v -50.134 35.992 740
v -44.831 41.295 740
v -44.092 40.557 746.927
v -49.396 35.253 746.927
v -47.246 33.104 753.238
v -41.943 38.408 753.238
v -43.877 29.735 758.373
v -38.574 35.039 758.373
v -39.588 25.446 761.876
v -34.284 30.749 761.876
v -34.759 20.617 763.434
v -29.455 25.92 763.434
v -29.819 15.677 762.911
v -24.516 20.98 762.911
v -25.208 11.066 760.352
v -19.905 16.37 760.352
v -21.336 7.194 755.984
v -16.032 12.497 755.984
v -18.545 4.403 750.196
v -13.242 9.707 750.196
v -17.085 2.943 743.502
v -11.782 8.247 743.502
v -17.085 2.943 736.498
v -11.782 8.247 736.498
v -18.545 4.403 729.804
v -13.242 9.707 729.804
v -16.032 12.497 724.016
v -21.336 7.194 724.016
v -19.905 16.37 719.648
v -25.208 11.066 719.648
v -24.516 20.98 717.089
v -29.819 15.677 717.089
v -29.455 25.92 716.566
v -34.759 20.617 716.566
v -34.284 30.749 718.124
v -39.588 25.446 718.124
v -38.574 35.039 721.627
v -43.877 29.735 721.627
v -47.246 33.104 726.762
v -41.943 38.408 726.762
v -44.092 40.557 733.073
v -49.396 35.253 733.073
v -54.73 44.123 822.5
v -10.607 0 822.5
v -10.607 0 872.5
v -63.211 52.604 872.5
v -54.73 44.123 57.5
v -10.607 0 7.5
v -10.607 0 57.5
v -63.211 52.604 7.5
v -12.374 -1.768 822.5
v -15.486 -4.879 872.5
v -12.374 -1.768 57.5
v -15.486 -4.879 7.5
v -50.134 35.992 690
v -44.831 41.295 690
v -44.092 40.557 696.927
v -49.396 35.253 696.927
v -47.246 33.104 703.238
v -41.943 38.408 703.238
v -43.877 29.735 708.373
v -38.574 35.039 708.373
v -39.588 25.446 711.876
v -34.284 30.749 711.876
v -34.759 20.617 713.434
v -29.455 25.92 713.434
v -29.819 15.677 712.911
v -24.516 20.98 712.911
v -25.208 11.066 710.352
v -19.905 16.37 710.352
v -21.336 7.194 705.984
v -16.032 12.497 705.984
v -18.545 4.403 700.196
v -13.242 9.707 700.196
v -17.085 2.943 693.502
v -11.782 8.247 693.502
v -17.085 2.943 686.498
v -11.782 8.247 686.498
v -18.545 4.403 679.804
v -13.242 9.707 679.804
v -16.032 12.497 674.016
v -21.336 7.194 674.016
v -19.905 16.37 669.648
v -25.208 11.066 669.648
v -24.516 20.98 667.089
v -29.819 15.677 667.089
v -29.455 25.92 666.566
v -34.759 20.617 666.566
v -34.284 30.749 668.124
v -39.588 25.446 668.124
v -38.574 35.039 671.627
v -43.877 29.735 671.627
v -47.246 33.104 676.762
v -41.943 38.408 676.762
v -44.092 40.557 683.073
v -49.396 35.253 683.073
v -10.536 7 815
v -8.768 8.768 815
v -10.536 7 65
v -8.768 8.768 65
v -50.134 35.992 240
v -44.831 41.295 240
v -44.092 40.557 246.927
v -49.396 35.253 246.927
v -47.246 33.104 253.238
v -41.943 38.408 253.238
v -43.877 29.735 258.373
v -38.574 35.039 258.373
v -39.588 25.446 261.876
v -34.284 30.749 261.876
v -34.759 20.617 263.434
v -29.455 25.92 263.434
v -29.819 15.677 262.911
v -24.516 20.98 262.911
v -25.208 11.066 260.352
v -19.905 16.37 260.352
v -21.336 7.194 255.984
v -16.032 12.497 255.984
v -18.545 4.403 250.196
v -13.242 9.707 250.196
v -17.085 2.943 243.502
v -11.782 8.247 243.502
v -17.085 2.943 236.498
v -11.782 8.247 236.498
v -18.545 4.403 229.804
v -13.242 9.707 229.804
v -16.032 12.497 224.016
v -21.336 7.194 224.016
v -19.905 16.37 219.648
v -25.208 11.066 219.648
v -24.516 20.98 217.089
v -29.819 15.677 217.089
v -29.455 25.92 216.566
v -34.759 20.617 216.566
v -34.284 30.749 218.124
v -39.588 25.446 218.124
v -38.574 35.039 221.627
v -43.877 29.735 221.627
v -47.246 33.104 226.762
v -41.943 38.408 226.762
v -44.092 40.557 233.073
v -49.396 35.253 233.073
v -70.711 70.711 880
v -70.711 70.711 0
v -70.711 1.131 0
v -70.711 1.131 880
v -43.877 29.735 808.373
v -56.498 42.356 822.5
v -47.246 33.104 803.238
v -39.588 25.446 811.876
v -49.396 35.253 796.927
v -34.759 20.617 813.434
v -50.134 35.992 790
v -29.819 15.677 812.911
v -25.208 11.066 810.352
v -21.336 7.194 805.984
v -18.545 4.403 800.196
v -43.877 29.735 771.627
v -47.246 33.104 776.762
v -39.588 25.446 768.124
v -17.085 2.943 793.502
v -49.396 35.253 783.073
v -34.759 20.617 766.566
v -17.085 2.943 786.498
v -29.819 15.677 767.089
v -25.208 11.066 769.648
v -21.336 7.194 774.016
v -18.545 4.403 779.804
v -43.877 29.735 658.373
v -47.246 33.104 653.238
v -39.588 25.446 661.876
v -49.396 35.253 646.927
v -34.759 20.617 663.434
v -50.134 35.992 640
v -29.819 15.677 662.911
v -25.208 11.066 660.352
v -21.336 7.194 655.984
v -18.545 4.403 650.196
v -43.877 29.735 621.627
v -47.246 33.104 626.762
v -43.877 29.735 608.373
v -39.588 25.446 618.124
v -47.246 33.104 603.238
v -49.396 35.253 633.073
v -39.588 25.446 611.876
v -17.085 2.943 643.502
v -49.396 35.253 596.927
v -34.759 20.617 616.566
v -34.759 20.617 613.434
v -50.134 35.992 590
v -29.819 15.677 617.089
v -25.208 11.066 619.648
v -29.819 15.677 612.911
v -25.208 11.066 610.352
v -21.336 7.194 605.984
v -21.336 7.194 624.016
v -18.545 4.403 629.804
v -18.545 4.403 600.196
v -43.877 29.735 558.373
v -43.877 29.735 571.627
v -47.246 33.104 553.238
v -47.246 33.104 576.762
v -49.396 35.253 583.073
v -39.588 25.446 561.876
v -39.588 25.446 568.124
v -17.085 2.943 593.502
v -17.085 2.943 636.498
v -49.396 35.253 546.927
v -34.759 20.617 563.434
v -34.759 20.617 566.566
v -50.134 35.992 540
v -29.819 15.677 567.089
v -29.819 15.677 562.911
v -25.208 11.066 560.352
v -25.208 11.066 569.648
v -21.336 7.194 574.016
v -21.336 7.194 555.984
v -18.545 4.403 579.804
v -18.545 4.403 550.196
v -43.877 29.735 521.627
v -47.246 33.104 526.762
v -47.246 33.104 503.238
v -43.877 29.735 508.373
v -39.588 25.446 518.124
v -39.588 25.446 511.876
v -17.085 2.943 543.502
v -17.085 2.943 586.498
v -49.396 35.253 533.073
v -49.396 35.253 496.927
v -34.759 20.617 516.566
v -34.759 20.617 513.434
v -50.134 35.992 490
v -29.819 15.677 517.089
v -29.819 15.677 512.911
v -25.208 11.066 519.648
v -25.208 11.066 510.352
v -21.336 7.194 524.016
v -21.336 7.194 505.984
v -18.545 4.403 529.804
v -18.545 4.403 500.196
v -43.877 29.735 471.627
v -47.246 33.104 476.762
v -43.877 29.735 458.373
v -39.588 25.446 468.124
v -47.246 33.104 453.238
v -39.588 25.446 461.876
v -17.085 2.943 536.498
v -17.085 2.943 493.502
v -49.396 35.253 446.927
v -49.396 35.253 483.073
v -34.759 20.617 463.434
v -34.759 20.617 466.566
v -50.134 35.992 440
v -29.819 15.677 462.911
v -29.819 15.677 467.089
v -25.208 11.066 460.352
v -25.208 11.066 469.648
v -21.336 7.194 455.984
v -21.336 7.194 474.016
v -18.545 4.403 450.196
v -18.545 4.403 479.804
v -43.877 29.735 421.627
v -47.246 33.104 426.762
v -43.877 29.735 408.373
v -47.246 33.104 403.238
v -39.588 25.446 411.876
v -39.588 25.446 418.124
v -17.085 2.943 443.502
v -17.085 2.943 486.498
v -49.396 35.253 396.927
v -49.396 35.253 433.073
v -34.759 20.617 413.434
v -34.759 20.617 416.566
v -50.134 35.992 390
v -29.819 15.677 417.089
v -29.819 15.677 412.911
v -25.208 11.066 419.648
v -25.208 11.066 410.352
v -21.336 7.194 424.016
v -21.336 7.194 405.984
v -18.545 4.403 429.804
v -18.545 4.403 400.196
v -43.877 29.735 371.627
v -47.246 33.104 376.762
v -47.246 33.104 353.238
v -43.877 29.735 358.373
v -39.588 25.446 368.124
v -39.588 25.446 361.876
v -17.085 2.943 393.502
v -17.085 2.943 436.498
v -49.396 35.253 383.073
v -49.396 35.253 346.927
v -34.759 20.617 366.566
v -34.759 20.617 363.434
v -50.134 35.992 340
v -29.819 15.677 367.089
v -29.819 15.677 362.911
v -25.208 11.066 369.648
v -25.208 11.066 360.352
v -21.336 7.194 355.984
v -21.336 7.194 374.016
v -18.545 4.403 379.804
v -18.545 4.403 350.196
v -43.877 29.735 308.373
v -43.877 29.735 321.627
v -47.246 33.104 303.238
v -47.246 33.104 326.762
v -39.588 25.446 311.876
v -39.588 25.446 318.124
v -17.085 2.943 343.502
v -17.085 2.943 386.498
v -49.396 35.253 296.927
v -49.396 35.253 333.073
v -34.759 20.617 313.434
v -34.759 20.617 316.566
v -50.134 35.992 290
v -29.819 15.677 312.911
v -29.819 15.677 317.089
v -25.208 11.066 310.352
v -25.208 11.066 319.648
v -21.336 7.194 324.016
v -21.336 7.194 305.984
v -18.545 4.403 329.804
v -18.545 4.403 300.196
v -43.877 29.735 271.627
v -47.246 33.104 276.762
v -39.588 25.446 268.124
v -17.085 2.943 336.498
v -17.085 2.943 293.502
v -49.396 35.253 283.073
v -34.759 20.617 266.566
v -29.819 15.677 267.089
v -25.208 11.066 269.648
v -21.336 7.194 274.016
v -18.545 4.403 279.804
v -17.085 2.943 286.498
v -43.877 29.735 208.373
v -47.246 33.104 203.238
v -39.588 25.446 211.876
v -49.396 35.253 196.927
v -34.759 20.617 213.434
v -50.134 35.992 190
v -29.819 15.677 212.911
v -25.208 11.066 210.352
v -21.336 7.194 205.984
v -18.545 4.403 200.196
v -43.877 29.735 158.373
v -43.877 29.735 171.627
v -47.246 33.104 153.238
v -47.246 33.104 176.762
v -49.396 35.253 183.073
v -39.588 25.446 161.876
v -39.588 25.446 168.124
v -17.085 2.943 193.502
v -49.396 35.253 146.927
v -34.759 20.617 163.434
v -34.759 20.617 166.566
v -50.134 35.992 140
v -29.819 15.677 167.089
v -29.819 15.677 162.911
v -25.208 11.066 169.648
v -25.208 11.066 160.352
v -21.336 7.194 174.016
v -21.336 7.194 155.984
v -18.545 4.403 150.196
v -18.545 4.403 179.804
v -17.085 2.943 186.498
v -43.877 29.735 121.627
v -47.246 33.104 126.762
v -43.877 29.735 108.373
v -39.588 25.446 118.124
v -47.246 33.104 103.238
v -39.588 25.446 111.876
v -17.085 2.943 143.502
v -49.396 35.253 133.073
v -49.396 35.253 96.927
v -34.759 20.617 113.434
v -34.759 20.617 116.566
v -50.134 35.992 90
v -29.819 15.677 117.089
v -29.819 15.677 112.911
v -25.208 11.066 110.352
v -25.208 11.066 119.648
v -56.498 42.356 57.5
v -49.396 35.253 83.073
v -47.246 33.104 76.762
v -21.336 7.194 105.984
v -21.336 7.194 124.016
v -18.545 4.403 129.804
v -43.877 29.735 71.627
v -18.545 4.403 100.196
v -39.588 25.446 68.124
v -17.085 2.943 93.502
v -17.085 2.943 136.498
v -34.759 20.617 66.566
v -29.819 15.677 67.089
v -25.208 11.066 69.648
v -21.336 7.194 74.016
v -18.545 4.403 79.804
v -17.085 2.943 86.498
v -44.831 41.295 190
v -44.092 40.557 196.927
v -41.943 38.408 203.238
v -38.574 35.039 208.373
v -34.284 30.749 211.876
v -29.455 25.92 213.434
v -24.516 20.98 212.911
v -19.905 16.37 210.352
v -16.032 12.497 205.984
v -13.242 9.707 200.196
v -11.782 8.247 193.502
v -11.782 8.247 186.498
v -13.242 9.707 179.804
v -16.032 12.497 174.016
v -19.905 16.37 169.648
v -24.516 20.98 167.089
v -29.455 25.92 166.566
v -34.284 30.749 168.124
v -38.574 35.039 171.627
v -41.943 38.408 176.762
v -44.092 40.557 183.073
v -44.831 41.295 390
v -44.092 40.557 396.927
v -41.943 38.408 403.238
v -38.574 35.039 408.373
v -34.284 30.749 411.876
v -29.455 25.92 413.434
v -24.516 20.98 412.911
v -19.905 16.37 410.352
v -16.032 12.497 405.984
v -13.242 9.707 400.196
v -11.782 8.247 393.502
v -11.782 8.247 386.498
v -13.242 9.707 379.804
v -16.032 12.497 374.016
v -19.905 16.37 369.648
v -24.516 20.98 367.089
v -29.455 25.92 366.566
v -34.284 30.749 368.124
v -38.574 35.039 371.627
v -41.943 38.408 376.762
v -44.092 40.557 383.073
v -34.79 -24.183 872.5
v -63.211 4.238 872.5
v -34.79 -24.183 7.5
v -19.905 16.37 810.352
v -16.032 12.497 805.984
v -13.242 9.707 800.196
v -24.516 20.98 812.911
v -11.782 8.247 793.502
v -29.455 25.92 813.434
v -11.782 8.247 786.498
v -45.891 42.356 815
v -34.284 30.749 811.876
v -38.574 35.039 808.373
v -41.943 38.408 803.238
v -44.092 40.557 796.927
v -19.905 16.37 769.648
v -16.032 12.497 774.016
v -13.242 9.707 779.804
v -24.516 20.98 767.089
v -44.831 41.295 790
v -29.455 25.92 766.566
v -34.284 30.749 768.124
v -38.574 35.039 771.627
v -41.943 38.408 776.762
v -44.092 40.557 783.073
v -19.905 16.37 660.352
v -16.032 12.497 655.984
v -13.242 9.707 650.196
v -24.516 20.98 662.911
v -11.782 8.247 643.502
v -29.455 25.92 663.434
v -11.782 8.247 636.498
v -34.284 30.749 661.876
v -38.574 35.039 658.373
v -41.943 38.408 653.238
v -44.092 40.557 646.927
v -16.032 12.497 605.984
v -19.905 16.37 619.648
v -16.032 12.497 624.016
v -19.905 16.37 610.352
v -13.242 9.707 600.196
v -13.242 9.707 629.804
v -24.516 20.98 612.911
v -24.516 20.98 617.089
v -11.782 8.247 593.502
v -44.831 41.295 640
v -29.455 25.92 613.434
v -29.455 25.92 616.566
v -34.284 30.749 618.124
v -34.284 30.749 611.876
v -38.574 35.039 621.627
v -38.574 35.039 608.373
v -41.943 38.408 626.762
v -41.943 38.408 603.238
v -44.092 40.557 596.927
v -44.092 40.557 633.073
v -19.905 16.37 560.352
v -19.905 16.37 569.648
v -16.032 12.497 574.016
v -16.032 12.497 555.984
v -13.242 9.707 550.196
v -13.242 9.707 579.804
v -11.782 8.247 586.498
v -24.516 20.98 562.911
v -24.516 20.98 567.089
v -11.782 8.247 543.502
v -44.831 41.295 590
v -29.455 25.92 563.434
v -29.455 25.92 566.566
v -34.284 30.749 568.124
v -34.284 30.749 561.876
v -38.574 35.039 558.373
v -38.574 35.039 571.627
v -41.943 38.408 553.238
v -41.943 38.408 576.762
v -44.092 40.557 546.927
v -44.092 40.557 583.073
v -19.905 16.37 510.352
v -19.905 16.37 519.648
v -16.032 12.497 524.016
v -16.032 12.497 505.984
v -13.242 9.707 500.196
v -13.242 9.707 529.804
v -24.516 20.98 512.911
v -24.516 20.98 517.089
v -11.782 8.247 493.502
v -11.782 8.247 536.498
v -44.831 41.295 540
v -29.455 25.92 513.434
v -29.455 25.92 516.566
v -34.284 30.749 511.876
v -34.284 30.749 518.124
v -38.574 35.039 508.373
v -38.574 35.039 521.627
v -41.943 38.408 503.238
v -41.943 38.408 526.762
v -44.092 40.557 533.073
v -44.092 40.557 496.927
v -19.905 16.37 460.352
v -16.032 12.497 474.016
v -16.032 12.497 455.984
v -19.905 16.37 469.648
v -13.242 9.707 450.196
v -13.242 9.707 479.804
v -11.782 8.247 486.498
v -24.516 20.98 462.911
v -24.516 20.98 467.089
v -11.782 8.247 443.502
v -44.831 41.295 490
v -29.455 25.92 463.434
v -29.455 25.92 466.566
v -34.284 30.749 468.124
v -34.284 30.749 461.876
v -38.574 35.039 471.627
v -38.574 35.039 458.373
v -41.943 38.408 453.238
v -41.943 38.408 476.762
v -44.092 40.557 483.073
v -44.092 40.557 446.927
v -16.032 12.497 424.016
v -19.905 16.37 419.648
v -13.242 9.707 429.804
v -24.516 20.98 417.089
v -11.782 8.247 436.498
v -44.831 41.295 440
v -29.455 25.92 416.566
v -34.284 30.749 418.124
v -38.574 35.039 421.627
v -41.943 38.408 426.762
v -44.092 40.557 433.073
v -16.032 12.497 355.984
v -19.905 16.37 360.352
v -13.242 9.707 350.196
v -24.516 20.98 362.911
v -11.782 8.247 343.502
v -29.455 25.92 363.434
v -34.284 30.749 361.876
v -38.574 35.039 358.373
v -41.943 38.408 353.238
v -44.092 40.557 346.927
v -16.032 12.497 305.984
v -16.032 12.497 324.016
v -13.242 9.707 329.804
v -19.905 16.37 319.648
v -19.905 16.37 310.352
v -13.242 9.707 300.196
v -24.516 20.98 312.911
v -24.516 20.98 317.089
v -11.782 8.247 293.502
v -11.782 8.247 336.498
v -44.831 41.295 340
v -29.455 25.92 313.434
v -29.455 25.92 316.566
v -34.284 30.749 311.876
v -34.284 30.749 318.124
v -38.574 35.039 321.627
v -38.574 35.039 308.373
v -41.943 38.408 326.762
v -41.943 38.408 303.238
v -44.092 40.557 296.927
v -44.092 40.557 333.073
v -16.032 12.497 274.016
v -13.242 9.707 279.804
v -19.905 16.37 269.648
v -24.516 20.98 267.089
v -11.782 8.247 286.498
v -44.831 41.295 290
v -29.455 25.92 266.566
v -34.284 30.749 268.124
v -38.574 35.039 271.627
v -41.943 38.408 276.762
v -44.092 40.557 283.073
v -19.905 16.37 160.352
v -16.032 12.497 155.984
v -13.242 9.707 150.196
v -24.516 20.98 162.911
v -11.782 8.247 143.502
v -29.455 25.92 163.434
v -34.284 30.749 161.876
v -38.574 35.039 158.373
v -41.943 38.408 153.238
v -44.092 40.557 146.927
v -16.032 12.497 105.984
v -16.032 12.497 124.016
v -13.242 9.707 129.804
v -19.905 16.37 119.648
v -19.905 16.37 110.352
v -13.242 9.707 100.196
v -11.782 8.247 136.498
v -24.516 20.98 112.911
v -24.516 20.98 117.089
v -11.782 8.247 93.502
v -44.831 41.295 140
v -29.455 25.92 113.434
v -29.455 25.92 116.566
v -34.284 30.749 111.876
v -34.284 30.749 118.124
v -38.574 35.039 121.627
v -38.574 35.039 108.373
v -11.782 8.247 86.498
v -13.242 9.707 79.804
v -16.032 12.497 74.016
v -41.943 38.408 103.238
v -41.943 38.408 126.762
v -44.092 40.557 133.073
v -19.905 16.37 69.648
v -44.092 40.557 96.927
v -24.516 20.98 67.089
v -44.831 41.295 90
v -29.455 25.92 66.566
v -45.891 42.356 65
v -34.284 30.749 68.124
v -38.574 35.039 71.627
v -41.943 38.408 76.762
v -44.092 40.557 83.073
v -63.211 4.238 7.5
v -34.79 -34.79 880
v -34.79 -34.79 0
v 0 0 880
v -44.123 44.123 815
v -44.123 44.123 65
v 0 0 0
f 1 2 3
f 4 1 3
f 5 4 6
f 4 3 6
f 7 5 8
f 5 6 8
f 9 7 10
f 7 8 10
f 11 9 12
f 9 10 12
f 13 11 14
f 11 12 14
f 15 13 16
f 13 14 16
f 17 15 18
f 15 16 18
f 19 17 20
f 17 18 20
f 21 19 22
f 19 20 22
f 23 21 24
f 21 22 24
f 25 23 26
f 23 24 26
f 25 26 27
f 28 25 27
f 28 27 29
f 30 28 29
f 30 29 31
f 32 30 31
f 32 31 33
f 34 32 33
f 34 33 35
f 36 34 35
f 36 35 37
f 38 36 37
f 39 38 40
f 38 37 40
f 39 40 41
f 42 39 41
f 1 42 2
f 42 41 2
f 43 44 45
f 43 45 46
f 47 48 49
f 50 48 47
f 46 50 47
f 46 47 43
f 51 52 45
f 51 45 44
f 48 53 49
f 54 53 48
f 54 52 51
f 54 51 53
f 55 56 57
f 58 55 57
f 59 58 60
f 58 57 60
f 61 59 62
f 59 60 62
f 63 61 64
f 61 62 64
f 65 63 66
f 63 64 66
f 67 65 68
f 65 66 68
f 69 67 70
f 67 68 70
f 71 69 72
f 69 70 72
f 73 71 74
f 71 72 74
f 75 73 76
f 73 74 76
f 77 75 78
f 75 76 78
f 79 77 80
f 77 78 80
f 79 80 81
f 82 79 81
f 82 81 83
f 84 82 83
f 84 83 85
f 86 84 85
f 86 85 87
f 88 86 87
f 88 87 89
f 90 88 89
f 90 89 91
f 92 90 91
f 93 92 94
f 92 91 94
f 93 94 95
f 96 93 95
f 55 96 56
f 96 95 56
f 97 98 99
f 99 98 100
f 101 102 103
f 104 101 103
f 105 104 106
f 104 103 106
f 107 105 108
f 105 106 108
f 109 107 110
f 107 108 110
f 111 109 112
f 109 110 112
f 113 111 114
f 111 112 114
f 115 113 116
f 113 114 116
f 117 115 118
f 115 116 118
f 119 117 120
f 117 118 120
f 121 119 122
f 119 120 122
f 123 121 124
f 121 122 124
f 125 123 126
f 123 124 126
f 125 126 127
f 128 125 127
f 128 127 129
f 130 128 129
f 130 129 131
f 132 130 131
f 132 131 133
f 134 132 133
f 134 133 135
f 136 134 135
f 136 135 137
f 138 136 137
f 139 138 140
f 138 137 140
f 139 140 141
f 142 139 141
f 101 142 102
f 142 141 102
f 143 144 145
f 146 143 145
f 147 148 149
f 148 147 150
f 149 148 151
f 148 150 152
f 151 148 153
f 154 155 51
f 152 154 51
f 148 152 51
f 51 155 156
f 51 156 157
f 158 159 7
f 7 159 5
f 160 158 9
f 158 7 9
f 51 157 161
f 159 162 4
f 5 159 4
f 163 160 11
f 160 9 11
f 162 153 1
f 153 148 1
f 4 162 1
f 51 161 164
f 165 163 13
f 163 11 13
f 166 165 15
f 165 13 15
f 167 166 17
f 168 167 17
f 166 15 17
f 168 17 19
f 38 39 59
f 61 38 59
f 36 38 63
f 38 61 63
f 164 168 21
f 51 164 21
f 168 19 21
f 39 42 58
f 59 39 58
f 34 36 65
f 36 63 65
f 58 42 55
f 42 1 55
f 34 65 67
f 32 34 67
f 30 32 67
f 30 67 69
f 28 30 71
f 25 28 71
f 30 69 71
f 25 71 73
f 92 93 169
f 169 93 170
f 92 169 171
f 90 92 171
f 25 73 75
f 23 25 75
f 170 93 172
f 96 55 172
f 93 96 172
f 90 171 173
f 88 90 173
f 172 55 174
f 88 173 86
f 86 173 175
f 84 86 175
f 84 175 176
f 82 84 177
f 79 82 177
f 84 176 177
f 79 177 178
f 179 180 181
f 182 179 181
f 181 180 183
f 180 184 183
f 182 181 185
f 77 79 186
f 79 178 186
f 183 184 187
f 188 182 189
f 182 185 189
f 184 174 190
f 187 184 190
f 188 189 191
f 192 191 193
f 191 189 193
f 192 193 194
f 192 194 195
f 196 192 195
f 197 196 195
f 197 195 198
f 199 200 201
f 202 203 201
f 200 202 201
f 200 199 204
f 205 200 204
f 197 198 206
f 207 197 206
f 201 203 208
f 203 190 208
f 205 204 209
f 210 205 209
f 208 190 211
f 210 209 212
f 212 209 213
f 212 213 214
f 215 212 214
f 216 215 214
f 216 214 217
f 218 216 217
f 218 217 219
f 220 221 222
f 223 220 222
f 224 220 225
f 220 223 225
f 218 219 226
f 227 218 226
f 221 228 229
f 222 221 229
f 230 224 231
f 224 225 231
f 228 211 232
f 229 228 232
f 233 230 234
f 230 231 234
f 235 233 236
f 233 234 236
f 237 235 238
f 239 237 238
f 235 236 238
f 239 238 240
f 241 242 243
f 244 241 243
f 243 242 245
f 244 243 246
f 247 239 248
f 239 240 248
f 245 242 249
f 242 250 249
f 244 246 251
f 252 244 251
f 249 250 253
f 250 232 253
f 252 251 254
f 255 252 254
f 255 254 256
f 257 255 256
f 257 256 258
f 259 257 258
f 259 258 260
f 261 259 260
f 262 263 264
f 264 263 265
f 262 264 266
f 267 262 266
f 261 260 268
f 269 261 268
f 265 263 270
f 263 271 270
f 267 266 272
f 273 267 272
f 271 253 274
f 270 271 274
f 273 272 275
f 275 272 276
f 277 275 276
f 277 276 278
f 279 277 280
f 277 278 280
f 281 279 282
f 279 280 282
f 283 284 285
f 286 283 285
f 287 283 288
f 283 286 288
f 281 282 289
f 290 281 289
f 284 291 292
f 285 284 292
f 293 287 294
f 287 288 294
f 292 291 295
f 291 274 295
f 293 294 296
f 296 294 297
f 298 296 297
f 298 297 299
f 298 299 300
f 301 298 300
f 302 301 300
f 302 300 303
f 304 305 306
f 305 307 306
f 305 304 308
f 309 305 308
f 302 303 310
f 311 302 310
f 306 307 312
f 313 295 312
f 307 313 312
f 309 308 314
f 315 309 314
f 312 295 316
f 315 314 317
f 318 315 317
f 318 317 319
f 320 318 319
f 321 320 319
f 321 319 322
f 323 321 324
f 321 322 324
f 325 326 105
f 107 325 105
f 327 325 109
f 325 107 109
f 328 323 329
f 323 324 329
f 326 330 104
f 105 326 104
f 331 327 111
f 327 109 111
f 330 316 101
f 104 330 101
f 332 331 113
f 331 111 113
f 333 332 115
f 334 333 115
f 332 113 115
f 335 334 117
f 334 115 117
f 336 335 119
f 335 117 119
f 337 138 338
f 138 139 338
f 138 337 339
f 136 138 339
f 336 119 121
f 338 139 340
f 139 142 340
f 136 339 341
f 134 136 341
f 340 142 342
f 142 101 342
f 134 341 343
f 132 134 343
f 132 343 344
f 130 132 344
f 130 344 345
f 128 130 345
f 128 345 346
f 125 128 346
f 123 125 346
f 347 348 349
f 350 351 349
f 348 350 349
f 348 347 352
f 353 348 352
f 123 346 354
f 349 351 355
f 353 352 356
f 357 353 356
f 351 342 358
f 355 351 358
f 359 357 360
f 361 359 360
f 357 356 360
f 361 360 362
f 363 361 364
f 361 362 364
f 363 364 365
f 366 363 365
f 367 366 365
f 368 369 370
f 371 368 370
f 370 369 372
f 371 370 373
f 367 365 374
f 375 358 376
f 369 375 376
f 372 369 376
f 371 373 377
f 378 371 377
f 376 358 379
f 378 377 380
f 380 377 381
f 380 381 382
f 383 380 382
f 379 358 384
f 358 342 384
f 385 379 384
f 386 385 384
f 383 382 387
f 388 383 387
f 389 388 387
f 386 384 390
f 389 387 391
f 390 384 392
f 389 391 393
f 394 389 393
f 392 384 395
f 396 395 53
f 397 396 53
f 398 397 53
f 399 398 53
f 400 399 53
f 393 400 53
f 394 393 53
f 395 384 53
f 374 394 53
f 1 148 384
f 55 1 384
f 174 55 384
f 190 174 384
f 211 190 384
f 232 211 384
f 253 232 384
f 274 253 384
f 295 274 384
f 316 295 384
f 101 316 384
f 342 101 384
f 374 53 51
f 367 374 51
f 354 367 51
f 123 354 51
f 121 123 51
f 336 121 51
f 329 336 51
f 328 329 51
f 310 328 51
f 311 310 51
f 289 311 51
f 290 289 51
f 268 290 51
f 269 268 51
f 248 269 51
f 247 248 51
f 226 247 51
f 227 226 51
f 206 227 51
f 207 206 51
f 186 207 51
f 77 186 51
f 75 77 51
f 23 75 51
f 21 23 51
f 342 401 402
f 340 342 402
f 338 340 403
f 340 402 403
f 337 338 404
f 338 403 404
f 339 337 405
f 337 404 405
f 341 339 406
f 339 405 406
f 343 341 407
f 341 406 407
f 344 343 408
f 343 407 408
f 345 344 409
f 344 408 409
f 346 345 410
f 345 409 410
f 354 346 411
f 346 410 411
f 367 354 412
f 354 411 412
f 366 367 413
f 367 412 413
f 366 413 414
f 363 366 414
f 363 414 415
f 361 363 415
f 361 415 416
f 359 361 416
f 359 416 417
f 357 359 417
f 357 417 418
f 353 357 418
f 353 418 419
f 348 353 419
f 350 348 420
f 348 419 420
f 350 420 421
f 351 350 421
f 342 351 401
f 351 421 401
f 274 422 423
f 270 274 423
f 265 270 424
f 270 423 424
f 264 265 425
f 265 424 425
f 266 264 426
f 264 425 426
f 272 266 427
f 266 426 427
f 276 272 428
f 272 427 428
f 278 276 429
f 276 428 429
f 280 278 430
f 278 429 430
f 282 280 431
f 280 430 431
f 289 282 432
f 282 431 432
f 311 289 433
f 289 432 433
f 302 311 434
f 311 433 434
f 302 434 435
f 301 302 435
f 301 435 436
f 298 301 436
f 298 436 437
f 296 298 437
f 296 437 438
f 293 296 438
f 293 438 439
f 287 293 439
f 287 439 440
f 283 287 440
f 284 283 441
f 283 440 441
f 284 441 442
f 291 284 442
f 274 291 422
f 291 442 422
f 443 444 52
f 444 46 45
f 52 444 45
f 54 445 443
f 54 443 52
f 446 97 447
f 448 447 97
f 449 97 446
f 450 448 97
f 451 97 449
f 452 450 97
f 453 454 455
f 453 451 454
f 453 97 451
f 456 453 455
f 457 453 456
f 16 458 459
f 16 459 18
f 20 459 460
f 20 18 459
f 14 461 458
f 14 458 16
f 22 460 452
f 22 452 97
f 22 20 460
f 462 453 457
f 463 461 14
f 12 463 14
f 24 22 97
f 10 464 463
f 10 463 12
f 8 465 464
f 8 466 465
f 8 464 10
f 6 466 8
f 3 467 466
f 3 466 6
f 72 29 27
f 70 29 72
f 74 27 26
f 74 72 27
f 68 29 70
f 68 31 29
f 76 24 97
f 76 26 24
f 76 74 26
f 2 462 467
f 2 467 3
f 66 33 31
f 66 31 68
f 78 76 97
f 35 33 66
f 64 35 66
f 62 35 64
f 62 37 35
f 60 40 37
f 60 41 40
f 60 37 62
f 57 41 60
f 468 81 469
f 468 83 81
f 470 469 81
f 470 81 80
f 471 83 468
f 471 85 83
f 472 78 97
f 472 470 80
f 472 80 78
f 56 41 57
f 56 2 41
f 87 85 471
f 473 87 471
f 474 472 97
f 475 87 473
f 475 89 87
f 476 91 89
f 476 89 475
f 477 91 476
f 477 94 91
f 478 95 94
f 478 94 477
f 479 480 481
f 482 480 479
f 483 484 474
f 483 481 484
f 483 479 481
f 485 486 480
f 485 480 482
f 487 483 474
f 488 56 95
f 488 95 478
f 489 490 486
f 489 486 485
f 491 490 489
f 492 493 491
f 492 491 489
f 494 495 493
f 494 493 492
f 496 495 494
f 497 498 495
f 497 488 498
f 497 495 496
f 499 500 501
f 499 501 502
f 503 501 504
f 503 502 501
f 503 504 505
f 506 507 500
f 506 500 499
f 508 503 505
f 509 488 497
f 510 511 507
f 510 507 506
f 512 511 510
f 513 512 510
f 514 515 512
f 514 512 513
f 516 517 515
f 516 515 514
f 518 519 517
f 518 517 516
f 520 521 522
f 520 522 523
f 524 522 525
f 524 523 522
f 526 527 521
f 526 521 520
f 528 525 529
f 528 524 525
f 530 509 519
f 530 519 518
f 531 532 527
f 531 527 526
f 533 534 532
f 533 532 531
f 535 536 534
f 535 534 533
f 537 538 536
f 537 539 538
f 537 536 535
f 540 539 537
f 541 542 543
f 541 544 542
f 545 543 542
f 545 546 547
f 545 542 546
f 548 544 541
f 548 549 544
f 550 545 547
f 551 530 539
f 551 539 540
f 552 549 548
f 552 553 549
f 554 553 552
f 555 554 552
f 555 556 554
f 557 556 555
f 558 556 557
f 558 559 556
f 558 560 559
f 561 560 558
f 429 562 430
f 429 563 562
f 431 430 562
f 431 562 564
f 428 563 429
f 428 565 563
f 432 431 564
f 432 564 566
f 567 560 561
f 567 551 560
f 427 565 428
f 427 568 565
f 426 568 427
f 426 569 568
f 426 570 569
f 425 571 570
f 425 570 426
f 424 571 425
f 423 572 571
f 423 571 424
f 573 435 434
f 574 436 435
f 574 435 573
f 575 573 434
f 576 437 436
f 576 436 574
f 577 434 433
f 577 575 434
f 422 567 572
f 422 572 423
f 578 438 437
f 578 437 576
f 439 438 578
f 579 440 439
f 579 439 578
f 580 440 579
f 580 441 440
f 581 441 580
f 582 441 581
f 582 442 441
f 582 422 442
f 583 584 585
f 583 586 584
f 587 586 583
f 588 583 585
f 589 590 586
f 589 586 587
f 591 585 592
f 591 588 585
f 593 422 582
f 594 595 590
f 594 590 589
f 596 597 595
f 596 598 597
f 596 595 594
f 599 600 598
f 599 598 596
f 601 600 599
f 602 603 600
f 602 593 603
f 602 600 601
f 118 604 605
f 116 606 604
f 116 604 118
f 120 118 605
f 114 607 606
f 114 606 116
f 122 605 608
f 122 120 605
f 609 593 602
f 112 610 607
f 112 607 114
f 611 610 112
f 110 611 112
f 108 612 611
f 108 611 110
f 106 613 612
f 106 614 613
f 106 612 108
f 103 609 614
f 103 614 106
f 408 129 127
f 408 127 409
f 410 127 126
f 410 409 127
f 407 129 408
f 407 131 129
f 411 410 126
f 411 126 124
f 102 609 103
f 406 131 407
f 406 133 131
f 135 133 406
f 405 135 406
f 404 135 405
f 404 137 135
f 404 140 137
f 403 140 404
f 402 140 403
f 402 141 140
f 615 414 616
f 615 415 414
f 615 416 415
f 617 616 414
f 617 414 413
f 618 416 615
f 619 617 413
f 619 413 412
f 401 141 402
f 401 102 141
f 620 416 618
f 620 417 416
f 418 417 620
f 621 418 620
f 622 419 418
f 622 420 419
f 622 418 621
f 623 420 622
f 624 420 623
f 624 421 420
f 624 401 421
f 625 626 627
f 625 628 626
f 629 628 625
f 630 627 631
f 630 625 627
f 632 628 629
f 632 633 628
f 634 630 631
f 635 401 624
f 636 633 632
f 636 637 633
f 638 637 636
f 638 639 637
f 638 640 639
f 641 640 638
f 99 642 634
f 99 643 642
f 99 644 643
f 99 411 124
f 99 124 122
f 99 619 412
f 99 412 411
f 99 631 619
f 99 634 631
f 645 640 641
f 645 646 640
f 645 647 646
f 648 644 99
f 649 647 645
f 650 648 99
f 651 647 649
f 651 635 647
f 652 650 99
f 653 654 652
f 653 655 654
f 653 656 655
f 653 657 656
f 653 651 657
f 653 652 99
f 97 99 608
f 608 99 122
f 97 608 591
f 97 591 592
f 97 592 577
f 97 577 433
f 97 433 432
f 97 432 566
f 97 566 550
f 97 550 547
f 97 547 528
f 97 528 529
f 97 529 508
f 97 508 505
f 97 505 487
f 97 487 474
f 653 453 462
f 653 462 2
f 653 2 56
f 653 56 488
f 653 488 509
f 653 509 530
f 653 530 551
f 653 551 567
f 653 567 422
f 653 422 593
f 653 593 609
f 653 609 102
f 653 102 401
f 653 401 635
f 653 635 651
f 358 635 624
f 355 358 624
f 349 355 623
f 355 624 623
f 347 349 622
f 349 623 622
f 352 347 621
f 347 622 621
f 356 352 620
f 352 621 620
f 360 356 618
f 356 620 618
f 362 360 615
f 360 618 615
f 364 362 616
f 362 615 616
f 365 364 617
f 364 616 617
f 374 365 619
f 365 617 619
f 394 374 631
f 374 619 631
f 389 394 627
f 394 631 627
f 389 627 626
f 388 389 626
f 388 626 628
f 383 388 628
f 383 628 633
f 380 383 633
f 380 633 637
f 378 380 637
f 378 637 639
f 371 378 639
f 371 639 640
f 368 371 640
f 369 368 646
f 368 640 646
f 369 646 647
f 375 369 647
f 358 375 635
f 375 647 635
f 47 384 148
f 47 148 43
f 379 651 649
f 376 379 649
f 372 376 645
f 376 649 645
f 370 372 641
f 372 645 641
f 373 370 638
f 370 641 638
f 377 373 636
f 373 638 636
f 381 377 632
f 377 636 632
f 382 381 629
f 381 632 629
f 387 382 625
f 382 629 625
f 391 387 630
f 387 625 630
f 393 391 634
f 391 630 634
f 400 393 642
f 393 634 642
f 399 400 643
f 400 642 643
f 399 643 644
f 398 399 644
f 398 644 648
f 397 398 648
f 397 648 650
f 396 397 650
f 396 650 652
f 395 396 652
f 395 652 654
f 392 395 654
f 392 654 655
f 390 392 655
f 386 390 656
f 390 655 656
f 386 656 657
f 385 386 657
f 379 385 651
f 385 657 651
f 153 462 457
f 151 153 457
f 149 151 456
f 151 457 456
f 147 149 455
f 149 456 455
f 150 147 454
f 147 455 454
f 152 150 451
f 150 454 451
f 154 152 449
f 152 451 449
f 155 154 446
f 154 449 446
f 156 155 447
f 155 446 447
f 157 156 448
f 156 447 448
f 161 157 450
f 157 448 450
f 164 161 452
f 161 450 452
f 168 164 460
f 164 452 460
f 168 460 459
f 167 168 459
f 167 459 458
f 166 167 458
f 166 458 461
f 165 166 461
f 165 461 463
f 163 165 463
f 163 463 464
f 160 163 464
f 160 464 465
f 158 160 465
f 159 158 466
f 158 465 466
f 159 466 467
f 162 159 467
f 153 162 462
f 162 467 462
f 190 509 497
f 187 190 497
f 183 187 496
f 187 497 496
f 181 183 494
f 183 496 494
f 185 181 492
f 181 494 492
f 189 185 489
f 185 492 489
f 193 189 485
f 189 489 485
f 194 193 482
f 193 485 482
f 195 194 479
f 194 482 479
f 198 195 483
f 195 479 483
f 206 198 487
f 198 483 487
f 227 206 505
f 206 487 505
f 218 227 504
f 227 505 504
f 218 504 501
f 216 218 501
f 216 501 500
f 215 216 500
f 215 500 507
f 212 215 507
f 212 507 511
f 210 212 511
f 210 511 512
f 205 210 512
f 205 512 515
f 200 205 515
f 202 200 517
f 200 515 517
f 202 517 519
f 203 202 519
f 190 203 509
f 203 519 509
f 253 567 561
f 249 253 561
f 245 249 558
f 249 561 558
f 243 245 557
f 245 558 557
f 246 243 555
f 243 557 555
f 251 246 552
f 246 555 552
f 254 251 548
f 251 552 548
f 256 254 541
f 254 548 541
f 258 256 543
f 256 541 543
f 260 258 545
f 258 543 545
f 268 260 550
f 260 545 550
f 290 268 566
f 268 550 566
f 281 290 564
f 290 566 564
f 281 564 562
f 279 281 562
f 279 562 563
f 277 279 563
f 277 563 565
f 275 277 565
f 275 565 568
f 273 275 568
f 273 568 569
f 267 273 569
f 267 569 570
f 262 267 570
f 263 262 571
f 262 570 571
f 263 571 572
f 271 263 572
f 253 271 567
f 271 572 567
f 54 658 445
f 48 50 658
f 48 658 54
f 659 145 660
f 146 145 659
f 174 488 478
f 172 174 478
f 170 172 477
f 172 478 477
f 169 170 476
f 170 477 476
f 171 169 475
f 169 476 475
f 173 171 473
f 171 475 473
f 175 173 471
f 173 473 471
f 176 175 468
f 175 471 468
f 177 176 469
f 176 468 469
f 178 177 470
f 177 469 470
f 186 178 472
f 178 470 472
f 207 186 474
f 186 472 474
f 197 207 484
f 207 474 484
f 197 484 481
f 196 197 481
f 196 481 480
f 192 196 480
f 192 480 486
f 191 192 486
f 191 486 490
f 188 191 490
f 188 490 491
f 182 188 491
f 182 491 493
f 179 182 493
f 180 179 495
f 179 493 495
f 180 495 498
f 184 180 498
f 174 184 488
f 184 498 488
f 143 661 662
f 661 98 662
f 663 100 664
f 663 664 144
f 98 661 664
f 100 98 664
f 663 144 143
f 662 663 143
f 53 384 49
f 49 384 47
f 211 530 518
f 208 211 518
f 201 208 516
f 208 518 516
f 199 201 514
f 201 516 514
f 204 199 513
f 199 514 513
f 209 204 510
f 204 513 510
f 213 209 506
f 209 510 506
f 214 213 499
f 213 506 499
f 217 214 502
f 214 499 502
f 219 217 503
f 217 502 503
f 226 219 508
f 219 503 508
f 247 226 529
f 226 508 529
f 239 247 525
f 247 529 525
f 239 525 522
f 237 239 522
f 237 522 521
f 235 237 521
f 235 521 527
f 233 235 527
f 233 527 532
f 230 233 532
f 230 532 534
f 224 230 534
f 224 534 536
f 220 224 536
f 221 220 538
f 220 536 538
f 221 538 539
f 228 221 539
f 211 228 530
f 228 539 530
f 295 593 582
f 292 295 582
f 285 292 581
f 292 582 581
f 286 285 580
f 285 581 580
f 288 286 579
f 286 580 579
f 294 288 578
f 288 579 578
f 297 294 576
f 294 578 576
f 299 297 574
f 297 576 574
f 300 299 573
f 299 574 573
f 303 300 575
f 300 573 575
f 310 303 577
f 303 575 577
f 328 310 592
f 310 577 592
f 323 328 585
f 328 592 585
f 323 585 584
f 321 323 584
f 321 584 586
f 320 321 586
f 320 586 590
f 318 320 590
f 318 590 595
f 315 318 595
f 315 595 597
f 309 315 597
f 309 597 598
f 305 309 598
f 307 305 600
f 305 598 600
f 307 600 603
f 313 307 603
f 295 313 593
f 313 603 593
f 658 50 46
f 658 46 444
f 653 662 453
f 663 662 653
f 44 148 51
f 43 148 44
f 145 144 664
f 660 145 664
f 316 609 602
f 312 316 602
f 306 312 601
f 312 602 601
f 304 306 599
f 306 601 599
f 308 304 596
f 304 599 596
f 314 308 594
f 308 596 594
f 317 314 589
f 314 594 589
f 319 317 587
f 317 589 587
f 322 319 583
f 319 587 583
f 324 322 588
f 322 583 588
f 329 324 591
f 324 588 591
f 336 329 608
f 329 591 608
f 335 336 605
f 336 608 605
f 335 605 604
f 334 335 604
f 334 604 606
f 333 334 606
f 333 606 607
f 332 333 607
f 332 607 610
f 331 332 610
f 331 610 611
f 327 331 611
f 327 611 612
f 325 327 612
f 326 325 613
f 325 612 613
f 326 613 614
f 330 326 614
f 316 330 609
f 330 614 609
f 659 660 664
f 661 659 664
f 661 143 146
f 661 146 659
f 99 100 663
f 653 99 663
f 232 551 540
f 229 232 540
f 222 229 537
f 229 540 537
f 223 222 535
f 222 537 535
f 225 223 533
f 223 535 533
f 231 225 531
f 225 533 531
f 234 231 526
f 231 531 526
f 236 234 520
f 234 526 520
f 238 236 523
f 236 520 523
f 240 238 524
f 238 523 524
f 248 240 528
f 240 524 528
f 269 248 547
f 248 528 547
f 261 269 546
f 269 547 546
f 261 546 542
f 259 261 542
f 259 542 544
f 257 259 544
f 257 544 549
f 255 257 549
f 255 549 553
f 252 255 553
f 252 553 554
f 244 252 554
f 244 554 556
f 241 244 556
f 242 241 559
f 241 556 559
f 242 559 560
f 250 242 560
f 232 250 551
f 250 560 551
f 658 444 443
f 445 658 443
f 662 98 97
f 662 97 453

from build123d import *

# Parameters (mm, degrees)
BOSS_EXTRUDE1_DEPTH = 880
CHAMFER1_SIZE       = 50.8
CHAMFER1_SIZE2      = 71.842048969
SKETCH3_W           = 750
SKETCH3_H           = 50
CUT_EXTRUDE1_DEPTH  = 2.5
SKETCH4_R           = 23.5
CUT_EXTRUDE2_DEPTH  = 11.9
SHELL1_START        = -14.4
SHELL1_OUTLINE_W    = 62.4
SHELL1_OUTLINE_H    = 765
SHELL1_OUTLINE_R    = 23.5
SHELL1_DEPTH        = 4.4
SHELL1_START_2      = 7.5
SHELL1_2_DEPTH      = 865
SHELL1_3_DEPTH      = 50
SHELL1_START_3      = 822.5
SHELL1_4_DEPTH      = 50


with BuildPart() as part:
    # Sketch1 → Boss-Extrude1 (new body)
    with BuildSketch(Plane.XY):
        Polygon((-70.710678119, 70.710678119), (-70.710678119, -70.710678119), (0, 0), align=None)
    extrude(amount=BOSS_EXTRUDE1_DEPTH)

    # Chamfer1
    chamfer1_edges = [part.edges().sort_by_distance(p)[0] for p in [
        (-70.710678119, -70.710678119, 440),
    ]]
    chamfer1_side = [part.faces().sort_by_distance(p)[0] for p in [
        (-35.355339059, -35.355339059, 440),
    ]]
    chamfer(chamfer1_edges, length=CHAMFER1_SIZE, length2=CHAMFER1_SIZE2, reference=chamfer1_side[0])

    # Sketch3 → Cut-Extrude1 (cut)
    with BuildSketch(Plane(origin=(0, 0, 0), x_dir=(0, 0, -1), z_dir=(0.7071067811865493, 0.7071067811865457, 0))):
        with Locations((-440, 37.4)):
            Rectangle(SKETCH3_W, SKETCH3_H)
    extrude(amount=-CUT_EXTRUDE1_DEPTH, mode=Mode.SUBTRACT)

    # Sketch4 → Cut-Extrude2 (cut)
    with BuildSketch(Plane(origin=(-1.767766953, -1.767766953, 0), x_dir=(0, 0, -1), z_dir=(0.7071067811865652, 0.7071067811865298, 0))):
        with Locations(Location((-440, 37.4, 0), (0, 0, 90))):
            Circle(SKETCH4_R)
        with Locations(Location((-490, 37.4, 0), (0, 0, 90))):
            Circle(SKETCH4_R)
        with Locations(Location((-540, 37.4, 0), (0, 0, 90))):
            Circle(SKETCH4_R)
        with Locations(Location((-590, 37.4, 0), (0, 0, 90))):
            Circle(SKETCH4_R)
        with Locations(Location((-640, 37.4, 0), (0, 0, 90))):
            Circle(SKETCH4_R)
        with Locations(Location((-690, 37.4, 0), (0, 0, 90))):
            Circle(SKETCH4_R)
        with Locations(Location((-740, 37.4, 0), (0, 0, 90))):
            Circle(SKETCH4_R)
        with Locations(Location((-790, 37.4, 0), (0, 0, 90))):
            Circle(SKETCH4_R)
        with Locations(Location((-390, 37.4, 0), (0, 0, 90))):
            Circle(SKETCH4_R)
        with Locations(Location((-340, 37.4, 0), (0, 0, 90))):
            Circle(SKETCH4_R)
        with Locations(Location((-290, 37.4, 0), (0, 0, 90))):
            Circle(SKETCH4_R)
        with Locations(Location((-240, 37.4, 0), (0, 0, 90))):
            Circle(SKETCH4_R)
        with Locations(Location((-190, 37.4, 0), (0, 0, 90))):
            Circle(SKETCH4_R)
        with Locations(Location((-140, 37.4, 0), (0, 0, 90))):
            Circle(SKETCH4_R)
        with Locations(Location((-90, 37.4, 0), (0, 0, 90))):
            Circle(SKETCH4_R)
    extrude(amount=-CUT_EXTRUDE2_DEPTH, mode=Mode.SUBTRACT)

    # Shell1: read off the stored shape, not the designer's step
    # Shell1 outline → Shell1 (cut)
    with BuildSketch(Plane(origin=(0, 0, 0), x_dir=(0.7071067811865474, -0.7071067811865477, 0), z_dir=(0.7071067811865476, 0.7071067811865476, 0)).offset(SHELL1_START)):
        with Locations((-38.7, -440)):
            Rectangle(SHELL1_OUTLINE_W, SHELL1_OUTLINE_H)
        with Locations((-37.4, -790)):
            Circle(SHELL1_OUTLINE_R, mode=Mode.SUBTRACT)
        with Locations((-37.4, -740)):
            Circle(SHELL1_OUTLINE_R, mode=Mode.SUBTRACT)
        with Locations((-37.4, -690)):
            Circle(SHELL1_OUTLINE_R, mode=Mode.SUBTRACT)
        with Locations((-37.4, -640)):
            Circle(SHELL1_OUTLINE_R, mode=Mode.SUBTRACT)
        with Locations((-37.4, -590)):
            Circle(SHELL1_OUTLINE_R, mode=Mode.SUBTRACT)
        with Locations((-37.4, -540)):
            Circle(SHELL1_OUTLINE_R, mode=Mode.SUBTRACT)
        with Locations((-37.4, -490)):
            Circle(SHELL1_OUTLINE_R, mode=Mode.SUBTRACT)
        with Locations((-37.4, -440)):
            Circle(SHELL1_OUTLINE_R, mode=Mode.SUBTRACT)
        with Locations((-37.4, -390)):
            Circle(SHELL1_OUTLINE_R, mode=Mode.SUBTRACT)
        with Locations((-37.4, -340)):
            Circle(SHELL1_OUTLINE_R, mode=Mode.SUBTRACT)
        with Locations((-37.4, -290)):
            Circle(SHELL1_OUTLINE_R, mode=Mode.SUBTRACT)
        with Locations((-37.4, -240)):
            Circle(SHELL1_OUTLINE_R, mode=Mode.SUBTRACT)
        with Locations((-37.4, -190)):
            Circle(SHELL1_OUTLINE_R, mode=Mode.SUBTRACT)
        with Locations((-37.4, -140)):
            Circle(SHELL1_OUTLINE_R, mode=Mode.SUBTRACT)
        with Locations((-37.4, -90)):
            Circle(SHELL1_OUTLINE_R, mode=Mode.SUBTRACT)
    extrude(amount=SHELL1_DEPTH, mode=Mode.SUBTRACT)

    # Shell1 2 outline → Shell1 2 (cut)
    with BuildSketch(Plane.XY.offset(SHELL1_START_2)):
        Polygon((-54.730064864, 44.123463146), (-63.210678119, 52.604076401), (-63.210678119, 4.237972568), (-34.789653634, -24.183051917), (-15.485638508, -4.87903679), (-59.609101654, 39.244426356), align=None)
    extrude(amount=SHELL1_2_DEPTH, mode=Mode.SUBTRACT)

    # Shell1 3 outline → Shell1 3 (cut)
    with BuildSketch(Plane.XY.offset(SHELL1_START_2)):
        Polygon((-10.606601718, 0), (-54.730064864, 44.123463146), (-59.609101654, 39.244426356), (-15.485638508, -4.87903679), align=None)
    extrude(amount=SHELL1_3_DEPTH, mode=Mode.SUBTRACT)

    # Shell1 4 outline → Shell1 4 (cut)
    with BuildSketch(Plane.XY.offset(SHELL1_START_3)):
        Polygon((-10.606601718, 0), (-54.730064864, 44.123463146), (-59.609101654, 39.244426356), (-15.485638508, -4.87903679), align=None)
    extrude(amount=SHELL1_4_DEPTH, mode=Mode.SUBTRACT)


solid = part.part
